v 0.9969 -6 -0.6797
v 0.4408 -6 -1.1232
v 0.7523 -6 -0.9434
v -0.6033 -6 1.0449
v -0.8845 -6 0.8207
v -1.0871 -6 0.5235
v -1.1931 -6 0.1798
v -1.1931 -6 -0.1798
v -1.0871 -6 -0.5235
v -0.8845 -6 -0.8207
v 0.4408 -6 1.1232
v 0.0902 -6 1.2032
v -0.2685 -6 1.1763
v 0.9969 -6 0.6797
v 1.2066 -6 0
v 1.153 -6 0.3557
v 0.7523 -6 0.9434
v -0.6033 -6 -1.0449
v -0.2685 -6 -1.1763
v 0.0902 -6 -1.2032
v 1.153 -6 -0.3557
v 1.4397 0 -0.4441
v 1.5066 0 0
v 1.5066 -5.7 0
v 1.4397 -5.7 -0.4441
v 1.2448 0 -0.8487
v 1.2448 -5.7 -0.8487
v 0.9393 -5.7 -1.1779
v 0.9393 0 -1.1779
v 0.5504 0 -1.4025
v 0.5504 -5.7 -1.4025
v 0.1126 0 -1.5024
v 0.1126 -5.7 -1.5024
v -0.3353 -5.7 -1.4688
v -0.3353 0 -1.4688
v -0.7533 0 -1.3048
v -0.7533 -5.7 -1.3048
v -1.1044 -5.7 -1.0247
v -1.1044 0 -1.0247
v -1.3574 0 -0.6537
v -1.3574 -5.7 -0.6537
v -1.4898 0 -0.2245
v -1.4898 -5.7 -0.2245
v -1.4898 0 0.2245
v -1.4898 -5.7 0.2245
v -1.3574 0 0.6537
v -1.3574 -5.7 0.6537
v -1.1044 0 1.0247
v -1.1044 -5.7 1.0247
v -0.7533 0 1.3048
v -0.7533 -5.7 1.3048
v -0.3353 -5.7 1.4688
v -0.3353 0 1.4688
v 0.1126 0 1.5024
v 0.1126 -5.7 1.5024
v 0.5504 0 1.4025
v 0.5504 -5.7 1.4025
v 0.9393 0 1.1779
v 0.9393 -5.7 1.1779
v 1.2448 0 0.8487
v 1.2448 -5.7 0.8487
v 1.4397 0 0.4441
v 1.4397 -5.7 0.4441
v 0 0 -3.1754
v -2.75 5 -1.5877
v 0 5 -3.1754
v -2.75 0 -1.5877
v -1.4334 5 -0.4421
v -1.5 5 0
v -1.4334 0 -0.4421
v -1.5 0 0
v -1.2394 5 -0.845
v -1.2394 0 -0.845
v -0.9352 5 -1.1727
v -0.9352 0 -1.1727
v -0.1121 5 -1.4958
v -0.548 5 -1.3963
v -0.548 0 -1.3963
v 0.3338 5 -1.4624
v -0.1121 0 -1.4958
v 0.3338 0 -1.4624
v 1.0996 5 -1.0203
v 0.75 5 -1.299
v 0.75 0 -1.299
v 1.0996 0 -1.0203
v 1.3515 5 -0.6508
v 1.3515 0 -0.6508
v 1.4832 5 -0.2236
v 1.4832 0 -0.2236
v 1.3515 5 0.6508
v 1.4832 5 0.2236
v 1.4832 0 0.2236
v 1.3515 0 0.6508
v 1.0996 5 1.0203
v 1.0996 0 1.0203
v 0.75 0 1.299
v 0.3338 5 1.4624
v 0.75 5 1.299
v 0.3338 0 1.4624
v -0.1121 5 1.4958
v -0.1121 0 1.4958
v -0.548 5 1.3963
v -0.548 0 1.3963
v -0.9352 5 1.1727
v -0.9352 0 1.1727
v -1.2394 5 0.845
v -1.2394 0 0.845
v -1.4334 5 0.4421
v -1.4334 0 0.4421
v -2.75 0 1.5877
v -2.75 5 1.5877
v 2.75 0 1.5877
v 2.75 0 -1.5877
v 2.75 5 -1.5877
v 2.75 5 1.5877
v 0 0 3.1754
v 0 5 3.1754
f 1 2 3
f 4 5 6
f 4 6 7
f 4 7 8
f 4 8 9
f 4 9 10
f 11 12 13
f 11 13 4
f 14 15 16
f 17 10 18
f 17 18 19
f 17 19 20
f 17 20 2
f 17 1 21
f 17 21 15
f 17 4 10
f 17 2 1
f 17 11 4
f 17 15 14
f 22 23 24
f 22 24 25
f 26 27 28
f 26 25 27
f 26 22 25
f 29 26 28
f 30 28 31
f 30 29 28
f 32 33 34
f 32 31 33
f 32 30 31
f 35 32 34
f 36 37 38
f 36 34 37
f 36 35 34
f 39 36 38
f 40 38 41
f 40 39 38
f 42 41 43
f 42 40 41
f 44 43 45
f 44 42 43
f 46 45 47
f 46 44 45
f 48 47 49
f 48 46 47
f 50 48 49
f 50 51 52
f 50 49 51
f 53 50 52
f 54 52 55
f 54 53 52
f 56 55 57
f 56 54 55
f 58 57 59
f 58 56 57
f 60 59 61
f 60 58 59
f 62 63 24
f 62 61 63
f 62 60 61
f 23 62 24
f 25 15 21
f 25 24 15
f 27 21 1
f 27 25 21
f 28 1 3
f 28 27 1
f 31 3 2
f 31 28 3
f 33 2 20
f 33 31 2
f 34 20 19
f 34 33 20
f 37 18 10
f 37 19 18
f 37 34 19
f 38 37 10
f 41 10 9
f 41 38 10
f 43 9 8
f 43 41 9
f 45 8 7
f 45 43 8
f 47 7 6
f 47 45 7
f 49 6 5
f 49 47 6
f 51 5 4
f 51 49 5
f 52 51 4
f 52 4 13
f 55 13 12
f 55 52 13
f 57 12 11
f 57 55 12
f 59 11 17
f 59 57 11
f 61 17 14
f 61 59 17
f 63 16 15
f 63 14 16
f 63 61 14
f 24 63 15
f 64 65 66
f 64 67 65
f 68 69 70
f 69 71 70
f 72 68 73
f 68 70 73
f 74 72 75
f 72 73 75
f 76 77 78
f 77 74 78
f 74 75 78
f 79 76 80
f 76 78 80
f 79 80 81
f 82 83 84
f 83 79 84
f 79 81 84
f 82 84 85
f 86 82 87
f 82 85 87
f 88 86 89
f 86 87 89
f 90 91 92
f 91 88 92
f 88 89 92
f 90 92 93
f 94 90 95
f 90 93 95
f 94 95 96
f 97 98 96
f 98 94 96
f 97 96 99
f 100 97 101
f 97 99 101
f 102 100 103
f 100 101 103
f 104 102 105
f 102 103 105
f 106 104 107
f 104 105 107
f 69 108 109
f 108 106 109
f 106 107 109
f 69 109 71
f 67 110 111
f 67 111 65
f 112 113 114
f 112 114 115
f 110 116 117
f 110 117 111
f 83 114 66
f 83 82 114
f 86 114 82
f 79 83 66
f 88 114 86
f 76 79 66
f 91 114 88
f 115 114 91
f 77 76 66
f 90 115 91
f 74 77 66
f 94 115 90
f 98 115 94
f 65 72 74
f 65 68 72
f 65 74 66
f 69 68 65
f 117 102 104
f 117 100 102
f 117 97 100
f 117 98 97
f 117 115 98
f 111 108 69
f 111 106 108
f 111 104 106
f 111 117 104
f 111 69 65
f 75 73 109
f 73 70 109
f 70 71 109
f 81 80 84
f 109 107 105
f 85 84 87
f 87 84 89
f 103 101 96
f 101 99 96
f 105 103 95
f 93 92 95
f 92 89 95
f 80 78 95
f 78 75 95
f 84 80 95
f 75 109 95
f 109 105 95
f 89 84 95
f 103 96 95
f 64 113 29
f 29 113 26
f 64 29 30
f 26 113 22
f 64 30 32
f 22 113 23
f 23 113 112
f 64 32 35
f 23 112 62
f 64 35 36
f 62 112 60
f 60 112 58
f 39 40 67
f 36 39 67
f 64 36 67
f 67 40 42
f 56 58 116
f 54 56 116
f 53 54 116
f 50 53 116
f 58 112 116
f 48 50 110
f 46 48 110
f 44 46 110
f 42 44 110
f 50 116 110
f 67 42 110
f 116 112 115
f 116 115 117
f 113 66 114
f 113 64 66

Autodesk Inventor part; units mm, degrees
ref_plane "YZ Plane" through (0, 0, 0) normal (1, 0, 0) x (0, 1, 0)
ref_plane "XZ Plane" through (0, 0, 0) normal (0, 1, 0) x (-1, 0, 0)
ref_plane "XY Plane" through (0, 0, 0) normal (0, 0, 1) x (1, 0, 0)
sketch "Sketch1" plane through (0, 0, 0) normal (0, 1, 0) x (-1, 0, 0)
  circle A0 centre (0, 0) radius 1.5
  line L0 (0, 3.1754) -> (2.75, 1.5877)
  line L1 (2.75, 1.5877) -> (2.75, -1.5877)
  line L2 (2.75, -1.5877) -> (0, -3.1754)
  line L3 (0, -3.1754) -> (-2.75, -1.5877)
  line L4 (-2.75, -1.5877) -> (-2.75, 1.5877)
  line L5 (-2.75, 1.5877) -> (0, 3.1754)
  dimension "d0" = 3
  dimension "d4" = 5.5
extrude "Extrusion1" add sketch "Sketch1" along normal blind 5
thread "Thread2" size "M3x0.5" class "6H" standard "ANSI Metric M Profile" full length
sketch "Sketch3" plane through (0, 0, 0) normal (0, -1, 0) x (1, 0, 0)
  circle A0 centre (0, 0) radius 1.5066
extrude "Extrusion3" add sketch "Sketch3" along normal blind 6
thread "Thread3" size "M3.5x0.6" class "6g" standard "ANSI Metric M Profile" full length
chamfer "Chamfer1" distance 0.3 angle 45 1 edges at (-1.5066, -6, 0)
properties part number "Spacer" material "Nylon 6"
